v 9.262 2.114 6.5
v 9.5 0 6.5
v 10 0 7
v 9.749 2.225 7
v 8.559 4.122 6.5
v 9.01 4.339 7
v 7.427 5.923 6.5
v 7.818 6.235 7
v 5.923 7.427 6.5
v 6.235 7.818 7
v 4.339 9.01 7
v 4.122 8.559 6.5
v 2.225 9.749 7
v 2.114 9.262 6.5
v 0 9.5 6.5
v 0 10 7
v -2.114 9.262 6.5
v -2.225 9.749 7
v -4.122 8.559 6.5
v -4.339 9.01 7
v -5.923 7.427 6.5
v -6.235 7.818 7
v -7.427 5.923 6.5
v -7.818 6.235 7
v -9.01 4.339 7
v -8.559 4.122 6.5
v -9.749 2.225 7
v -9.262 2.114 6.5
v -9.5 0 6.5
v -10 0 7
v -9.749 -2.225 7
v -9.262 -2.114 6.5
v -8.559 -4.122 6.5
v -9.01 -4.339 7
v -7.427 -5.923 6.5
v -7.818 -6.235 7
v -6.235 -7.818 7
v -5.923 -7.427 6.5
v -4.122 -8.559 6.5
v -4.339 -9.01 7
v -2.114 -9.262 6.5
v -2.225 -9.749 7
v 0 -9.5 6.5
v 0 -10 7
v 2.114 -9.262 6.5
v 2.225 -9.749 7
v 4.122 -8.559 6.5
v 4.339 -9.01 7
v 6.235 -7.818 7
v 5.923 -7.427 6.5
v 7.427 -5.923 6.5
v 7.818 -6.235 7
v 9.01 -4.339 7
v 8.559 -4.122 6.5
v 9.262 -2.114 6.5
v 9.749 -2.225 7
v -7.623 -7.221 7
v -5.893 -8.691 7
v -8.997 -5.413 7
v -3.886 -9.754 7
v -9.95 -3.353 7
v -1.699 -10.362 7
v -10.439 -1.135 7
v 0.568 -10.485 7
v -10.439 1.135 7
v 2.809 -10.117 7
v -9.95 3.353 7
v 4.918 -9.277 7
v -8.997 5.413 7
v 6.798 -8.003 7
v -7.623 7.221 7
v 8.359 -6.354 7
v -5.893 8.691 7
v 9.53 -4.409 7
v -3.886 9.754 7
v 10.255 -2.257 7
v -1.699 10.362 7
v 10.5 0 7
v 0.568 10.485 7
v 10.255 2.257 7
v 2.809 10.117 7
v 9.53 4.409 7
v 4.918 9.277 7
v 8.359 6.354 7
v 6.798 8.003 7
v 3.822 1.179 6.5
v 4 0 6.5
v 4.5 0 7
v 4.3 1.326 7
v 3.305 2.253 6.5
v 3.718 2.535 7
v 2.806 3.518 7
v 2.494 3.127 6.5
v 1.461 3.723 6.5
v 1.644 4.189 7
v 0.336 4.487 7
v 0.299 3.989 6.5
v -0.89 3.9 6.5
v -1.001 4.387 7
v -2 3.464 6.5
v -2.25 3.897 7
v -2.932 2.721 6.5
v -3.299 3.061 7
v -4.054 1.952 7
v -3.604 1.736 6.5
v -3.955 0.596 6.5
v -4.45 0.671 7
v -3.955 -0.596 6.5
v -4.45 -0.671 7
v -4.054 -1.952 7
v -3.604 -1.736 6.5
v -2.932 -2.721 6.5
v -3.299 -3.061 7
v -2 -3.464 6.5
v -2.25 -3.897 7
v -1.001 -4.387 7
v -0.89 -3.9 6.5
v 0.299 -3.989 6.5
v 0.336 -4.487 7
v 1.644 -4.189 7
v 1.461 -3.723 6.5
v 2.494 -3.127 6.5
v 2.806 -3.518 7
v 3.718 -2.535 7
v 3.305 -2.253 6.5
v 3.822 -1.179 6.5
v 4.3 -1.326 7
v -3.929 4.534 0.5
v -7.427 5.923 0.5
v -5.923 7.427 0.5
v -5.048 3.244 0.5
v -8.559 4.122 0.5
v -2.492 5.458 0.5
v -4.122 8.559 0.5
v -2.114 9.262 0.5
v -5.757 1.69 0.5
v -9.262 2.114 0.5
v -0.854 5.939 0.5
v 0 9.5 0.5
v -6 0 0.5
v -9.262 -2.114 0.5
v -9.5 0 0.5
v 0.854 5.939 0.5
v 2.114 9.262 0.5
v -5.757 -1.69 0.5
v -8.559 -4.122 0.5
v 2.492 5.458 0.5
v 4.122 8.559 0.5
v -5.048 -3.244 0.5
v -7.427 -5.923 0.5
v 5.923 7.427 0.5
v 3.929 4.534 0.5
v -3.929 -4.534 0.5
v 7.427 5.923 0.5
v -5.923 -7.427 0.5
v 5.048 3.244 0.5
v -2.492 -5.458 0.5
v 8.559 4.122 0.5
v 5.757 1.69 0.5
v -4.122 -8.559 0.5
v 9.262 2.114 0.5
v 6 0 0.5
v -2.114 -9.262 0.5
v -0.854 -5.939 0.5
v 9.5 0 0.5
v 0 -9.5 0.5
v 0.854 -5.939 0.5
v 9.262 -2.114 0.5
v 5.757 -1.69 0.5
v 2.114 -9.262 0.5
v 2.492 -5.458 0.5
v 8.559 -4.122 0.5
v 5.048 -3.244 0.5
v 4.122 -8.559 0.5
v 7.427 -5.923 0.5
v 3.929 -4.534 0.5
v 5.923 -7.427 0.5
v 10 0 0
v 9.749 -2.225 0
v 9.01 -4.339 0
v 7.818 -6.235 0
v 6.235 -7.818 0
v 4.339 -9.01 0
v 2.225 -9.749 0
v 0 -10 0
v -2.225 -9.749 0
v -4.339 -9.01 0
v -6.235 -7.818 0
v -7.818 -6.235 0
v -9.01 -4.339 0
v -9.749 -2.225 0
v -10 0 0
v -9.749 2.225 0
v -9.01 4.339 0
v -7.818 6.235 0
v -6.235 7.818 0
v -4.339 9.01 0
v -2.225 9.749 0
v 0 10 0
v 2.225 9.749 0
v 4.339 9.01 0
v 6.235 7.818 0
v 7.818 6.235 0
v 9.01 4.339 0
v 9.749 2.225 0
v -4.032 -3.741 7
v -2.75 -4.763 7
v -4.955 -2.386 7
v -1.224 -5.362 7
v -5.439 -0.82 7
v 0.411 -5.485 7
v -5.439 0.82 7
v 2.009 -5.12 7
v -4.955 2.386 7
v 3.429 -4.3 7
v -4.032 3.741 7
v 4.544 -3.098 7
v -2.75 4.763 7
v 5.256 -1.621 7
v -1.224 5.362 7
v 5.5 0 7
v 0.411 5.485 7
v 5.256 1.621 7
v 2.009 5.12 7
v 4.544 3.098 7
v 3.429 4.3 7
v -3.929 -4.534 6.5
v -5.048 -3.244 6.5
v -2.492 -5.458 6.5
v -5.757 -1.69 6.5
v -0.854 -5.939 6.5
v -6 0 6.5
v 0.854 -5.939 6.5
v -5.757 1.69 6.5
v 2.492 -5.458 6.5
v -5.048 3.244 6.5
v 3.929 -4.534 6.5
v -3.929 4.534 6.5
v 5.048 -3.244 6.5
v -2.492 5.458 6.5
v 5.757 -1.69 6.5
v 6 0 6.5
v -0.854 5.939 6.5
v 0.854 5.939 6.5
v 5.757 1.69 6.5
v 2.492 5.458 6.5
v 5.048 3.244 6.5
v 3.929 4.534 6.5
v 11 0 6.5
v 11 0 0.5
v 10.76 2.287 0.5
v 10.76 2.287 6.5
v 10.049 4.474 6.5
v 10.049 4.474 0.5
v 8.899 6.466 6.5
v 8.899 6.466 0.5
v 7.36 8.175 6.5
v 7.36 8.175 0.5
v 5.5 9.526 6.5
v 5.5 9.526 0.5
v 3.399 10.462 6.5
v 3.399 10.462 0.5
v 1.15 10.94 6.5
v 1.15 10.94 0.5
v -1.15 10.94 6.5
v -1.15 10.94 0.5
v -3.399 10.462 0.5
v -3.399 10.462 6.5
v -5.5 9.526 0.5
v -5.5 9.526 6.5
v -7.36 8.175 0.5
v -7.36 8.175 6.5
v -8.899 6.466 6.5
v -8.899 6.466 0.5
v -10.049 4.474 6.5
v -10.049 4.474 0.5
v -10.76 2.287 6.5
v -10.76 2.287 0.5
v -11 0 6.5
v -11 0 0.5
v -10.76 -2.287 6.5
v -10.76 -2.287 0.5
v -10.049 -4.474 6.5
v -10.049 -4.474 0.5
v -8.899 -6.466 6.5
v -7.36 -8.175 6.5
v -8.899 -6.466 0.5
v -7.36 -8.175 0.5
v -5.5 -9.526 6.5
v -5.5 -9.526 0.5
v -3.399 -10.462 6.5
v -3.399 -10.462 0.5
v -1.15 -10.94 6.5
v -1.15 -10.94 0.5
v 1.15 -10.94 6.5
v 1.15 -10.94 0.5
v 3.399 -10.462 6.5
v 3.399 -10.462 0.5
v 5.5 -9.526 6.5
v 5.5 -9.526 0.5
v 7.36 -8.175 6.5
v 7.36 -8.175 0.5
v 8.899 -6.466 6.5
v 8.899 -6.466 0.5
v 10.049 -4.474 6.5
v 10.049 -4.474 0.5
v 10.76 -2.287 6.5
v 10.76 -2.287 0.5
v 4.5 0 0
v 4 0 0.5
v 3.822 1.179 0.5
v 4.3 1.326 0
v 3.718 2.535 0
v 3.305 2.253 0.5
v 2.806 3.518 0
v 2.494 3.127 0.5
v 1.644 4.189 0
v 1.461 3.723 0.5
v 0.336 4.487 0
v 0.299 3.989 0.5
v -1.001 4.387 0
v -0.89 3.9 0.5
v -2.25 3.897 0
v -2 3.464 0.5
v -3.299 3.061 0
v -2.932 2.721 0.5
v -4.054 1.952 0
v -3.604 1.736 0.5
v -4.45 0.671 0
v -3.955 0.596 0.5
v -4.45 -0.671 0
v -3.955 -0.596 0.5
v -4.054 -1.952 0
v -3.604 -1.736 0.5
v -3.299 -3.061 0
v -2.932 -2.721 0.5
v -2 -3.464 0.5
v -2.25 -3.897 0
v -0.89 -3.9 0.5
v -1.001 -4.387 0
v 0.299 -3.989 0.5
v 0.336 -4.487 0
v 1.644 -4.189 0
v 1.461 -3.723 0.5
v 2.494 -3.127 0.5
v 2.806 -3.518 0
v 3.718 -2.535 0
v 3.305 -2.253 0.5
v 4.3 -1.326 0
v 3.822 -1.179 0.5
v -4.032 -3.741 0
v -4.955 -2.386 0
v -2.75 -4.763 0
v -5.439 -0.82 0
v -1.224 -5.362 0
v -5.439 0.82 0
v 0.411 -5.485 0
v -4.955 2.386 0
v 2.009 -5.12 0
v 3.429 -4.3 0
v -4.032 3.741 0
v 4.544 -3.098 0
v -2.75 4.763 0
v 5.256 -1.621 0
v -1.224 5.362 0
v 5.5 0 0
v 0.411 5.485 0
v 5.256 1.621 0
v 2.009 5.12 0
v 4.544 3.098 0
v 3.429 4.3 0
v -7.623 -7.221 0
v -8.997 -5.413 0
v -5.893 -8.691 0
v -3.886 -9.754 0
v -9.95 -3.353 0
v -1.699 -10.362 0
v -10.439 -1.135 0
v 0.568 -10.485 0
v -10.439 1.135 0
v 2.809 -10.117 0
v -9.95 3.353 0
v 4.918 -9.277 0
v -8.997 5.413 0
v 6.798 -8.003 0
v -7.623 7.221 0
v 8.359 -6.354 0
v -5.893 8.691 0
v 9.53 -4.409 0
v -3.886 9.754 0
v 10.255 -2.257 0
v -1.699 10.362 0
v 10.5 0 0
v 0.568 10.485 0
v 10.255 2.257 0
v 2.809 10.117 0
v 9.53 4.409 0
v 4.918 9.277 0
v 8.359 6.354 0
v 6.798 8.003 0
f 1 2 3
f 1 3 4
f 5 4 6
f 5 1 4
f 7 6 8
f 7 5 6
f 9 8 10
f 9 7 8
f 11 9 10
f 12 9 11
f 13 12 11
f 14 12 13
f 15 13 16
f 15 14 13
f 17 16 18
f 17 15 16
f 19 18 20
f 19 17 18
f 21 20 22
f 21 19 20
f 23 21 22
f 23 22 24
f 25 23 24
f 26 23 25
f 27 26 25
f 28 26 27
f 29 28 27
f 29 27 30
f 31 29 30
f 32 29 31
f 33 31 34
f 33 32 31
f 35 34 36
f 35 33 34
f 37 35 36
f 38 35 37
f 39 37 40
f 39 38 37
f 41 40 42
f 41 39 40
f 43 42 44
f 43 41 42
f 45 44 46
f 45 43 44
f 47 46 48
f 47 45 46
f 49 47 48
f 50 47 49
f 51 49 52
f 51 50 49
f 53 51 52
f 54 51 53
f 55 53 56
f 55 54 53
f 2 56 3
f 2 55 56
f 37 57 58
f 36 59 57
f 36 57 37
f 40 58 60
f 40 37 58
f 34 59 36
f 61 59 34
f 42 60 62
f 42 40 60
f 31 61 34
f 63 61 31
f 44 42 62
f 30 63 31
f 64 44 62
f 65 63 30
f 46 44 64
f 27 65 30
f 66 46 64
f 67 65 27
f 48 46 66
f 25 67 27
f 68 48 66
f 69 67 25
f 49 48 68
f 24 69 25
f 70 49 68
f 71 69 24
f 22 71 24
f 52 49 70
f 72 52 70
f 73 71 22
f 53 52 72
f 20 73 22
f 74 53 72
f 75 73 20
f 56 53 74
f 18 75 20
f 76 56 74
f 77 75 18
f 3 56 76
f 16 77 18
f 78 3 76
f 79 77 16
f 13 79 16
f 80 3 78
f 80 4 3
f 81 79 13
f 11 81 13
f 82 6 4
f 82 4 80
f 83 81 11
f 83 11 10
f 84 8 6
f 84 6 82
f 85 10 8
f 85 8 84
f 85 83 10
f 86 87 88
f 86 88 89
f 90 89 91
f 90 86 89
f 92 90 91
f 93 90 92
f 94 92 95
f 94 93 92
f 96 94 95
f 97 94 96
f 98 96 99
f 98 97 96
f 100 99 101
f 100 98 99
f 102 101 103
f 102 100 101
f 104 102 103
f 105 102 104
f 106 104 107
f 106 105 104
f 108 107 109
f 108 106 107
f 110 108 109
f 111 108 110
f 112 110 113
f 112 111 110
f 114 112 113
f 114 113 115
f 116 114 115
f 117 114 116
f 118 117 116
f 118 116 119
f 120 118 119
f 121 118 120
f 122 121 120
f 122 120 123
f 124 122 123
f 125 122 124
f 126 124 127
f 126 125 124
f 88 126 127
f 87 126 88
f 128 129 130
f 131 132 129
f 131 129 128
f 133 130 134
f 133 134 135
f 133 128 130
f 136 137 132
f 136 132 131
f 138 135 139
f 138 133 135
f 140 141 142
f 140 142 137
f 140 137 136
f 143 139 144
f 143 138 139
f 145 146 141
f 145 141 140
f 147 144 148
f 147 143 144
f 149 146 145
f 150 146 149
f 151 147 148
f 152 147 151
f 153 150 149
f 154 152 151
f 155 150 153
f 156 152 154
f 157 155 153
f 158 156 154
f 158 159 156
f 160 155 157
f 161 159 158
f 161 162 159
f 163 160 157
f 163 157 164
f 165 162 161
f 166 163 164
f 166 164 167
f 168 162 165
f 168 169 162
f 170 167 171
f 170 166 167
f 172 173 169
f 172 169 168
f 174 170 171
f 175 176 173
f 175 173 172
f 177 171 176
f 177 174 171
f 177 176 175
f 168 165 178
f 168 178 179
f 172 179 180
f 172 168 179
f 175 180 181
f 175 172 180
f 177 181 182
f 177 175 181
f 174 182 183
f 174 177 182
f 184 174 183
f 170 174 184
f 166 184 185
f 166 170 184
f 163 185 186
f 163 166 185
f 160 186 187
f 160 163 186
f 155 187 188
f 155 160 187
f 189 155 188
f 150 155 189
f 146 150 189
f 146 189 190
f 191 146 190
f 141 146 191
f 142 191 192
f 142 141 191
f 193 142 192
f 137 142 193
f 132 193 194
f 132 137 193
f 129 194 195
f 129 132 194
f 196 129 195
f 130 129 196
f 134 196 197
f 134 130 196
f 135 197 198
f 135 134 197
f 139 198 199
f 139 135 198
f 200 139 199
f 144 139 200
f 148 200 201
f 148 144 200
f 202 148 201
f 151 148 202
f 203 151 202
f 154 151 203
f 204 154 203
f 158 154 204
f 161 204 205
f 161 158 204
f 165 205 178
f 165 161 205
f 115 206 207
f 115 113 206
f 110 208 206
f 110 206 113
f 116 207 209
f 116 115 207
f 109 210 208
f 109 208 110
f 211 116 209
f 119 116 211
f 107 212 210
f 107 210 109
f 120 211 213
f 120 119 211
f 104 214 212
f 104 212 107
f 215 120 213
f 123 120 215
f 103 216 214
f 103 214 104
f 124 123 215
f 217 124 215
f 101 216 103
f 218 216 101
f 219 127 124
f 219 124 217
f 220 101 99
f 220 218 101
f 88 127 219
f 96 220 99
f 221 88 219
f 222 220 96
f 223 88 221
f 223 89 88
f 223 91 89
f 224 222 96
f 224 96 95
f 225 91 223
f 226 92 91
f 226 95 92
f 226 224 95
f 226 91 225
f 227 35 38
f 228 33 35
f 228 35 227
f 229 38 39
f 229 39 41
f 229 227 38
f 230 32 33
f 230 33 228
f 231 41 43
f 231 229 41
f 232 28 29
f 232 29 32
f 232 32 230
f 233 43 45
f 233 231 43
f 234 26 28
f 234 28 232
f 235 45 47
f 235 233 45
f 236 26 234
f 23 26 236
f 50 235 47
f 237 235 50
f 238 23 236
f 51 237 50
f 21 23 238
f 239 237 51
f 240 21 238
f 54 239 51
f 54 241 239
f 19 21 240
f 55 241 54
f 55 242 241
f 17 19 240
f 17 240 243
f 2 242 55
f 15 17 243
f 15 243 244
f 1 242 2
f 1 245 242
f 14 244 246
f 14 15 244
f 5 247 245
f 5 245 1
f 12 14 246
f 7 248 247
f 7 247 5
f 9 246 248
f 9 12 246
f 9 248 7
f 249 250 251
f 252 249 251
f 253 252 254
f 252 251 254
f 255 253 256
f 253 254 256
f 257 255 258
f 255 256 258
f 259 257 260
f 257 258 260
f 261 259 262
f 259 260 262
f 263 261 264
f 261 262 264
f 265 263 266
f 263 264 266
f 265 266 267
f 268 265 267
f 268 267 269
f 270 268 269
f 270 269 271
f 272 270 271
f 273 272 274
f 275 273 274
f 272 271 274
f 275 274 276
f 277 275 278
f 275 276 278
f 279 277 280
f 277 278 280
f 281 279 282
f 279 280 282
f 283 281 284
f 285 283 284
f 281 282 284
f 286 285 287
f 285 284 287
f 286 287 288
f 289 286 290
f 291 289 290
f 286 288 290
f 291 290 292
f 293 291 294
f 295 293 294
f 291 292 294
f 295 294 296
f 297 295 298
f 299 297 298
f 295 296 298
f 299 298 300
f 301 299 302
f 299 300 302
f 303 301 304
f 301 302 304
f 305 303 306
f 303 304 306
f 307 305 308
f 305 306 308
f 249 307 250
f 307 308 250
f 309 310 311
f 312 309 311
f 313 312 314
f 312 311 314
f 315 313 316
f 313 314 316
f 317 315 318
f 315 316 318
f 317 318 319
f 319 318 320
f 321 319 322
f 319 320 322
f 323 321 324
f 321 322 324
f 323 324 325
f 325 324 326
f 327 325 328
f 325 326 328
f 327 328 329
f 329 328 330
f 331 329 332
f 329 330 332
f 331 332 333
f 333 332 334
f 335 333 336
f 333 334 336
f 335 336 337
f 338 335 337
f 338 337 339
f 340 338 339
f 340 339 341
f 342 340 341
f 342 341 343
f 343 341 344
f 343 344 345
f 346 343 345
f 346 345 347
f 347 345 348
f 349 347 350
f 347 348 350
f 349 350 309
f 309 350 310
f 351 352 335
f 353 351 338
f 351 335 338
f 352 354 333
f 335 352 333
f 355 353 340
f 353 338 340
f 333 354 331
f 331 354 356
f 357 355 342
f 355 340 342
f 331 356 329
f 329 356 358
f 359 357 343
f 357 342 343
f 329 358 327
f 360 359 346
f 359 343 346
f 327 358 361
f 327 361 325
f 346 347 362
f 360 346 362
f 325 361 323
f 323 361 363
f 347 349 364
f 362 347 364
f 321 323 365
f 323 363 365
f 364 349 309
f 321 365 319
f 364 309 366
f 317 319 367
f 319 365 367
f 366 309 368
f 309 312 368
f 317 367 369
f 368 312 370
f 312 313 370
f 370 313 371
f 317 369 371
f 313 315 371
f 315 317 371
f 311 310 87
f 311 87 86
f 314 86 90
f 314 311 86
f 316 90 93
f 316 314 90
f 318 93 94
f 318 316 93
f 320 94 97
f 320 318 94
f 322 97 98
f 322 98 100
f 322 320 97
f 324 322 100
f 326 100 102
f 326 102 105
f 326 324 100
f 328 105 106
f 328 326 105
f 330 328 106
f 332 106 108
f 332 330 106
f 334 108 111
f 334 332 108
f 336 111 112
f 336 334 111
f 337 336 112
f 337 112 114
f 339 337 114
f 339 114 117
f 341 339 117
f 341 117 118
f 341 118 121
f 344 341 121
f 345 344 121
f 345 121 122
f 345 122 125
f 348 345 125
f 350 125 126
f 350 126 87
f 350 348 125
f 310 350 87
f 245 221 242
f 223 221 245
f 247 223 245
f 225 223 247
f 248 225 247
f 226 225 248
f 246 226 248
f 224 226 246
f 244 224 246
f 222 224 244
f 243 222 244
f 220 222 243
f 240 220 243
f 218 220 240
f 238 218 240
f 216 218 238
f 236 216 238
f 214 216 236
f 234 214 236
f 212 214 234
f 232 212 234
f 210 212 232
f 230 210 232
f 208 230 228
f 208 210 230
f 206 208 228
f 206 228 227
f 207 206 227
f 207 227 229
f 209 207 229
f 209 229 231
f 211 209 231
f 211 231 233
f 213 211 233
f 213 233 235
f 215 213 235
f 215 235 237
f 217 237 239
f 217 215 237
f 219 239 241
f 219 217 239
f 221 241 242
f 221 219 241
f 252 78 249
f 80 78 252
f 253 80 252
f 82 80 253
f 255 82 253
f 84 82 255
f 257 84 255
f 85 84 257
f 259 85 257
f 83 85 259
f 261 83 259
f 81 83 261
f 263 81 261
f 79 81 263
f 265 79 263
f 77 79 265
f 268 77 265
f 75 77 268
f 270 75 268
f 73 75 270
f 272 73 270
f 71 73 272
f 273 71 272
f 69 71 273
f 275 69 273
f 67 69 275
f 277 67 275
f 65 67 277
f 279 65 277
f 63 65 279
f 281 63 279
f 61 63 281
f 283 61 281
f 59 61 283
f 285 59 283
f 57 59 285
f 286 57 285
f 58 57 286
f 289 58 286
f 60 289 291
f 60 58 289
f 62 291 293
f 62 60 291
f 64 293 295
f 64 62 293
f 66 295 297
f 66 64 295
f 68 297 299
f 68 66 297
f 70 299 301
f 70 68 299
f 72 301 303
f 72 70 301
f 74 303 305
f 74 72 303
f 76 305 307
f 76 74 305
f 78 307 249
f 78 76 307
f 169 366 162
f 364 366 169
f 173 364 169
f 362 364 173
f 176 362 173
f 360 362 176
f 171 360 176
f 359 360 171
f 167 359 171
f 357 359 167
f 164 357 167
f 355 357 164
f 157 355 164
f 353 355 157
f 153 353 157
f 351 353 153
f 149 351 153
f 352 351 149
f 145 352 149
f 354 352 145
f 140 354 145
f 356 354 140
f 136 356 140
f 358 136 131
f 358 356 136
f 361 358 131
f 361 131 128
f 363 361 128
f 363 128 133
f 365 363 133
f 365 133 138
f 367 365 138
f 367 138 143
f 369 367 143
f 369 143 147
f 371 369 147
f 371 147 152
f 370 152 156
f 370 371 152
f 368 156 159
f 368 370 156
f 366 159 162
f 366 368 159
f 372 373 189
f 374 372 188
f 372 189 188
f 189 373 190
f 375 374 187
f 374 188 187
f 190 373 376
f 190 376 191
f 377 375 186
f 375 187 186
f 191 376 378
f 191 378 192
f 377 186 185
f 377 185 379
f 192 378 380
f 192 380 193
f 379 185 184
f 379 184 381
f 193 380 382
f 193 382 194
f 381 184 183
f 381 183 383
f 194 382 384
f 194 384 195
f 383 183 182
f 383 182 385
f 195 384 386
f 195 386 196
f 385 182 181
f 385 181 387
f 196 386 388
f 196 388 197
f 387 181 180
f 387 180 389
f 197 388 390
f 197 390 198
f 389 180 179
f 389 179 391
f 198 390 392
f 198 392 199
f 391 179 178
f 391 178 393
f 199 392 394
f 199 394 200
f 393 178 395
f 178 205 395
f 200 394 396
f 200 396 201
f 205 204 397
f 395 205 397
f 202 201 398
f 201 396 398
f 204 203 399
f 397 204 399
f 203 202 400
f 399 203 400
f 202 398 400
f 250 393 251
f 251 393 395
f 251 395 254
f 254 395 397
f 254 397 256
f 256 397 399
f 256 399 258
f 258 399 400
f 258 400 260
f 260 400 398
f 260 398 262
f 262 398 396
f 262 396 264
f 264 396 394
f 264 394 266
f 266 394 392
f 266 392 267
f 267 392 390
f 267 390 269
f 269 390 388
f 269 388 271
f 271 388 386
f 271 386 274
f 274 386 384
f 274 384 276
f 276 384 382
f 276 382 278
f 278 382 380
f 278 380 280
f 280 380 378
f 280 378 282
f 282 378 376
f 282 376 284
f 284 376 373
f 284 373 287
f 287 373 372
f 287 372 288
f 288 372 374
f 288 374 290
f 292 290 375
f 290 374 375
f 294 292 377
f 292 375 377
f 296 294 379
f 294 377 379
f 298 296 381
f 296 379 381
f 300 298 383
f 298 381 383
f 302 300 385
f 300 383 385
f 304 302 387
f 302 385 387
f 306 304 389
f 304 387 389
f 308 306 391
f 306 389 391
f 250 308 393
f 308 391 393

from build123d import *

# Parameters (mm, degrees)
ESQUISSE1_R             = 11
ESQUISSE1_R_2           = 4
BASE_EXTRUSION_DEPTH    = 7
ESQUISSE2_R             = 9.5
ESQUISSE2_R_2           = 6
ENL_V_MAT_EXTRU_1_DEPTH = 0.5
ENL_V_START             = -0.5
ESQUISSE3_R             = 9.5
ESQUISSE3_R_2           = 6
ENL_V_MAT_EXTRU_2_DEPTH = 0.5
CHANFREIN1_SIZE         = 0.5


with BuildPart() as part:
    # Esquisse1 → Base-Extrusion (new body)
    with BuildSketch(Plane.XY):
        Circle(ESQUISSE1_R)
        Circle(ESQUISSE1_R_2, mode=Mode.SUBTRACT)
    extrude(amount=BASE_EXTRUSION_DEPTH)

    # Esquisse2 → Enlèv. mat.-Extru.1 (cut)
    with BuildSketch(Plane.XY.offset(7)):
        Circle(ESQUISSE2_R)
        Circle(ESQUISSE2_R_2, mode=Mode.SUBTRACT)
    extrude(amount=-ENL_V_MAT_EXTRU_1_DEPTH, mode=Mode.SUBTRACT)

    # Esquisse3 → Enlèv. mat.-Extru.2 (cut)
    with BuildSketch(Plane(origin=(0, 0, 0), x_dir=(-1, 0, 0), z_dir=(0, 0, -1)).offset(ENL_V_START)):
        with Locations(Location((0, 0, 0), (0, 0, 180))):
            Circle(ESQUISSE3_R)
        with Locations(Location((0, 0, 0), (0, 0, 180))):
            Circle(ESQUISSE3_R_2, mode=Mode.SUBTRACT)
    extrude(amount=ENL_V_MAT_EXTRU_2_DEPTH, mode=Mode.SUBTRACT)

    # Chanfrein1
    chanfrein1_edges = [part.edges().sort_by_distance(p)[0] for p in [
        (-9.5, 0, 7),
        (-6, 0, 7),
        (-9.5, 0, 0),
        (-6, 0, 0),
        (-11, 0, 0),
        (-11, 0, 7),
        (-4, 0, 0),
        (-4, 0, 7),
    ]]
    chamfer(chanfrein1_edges, length=CHANFREIN1_SIZE - 0.0001)  # a hair under: the kernel refuses the full size


solid = part.part
